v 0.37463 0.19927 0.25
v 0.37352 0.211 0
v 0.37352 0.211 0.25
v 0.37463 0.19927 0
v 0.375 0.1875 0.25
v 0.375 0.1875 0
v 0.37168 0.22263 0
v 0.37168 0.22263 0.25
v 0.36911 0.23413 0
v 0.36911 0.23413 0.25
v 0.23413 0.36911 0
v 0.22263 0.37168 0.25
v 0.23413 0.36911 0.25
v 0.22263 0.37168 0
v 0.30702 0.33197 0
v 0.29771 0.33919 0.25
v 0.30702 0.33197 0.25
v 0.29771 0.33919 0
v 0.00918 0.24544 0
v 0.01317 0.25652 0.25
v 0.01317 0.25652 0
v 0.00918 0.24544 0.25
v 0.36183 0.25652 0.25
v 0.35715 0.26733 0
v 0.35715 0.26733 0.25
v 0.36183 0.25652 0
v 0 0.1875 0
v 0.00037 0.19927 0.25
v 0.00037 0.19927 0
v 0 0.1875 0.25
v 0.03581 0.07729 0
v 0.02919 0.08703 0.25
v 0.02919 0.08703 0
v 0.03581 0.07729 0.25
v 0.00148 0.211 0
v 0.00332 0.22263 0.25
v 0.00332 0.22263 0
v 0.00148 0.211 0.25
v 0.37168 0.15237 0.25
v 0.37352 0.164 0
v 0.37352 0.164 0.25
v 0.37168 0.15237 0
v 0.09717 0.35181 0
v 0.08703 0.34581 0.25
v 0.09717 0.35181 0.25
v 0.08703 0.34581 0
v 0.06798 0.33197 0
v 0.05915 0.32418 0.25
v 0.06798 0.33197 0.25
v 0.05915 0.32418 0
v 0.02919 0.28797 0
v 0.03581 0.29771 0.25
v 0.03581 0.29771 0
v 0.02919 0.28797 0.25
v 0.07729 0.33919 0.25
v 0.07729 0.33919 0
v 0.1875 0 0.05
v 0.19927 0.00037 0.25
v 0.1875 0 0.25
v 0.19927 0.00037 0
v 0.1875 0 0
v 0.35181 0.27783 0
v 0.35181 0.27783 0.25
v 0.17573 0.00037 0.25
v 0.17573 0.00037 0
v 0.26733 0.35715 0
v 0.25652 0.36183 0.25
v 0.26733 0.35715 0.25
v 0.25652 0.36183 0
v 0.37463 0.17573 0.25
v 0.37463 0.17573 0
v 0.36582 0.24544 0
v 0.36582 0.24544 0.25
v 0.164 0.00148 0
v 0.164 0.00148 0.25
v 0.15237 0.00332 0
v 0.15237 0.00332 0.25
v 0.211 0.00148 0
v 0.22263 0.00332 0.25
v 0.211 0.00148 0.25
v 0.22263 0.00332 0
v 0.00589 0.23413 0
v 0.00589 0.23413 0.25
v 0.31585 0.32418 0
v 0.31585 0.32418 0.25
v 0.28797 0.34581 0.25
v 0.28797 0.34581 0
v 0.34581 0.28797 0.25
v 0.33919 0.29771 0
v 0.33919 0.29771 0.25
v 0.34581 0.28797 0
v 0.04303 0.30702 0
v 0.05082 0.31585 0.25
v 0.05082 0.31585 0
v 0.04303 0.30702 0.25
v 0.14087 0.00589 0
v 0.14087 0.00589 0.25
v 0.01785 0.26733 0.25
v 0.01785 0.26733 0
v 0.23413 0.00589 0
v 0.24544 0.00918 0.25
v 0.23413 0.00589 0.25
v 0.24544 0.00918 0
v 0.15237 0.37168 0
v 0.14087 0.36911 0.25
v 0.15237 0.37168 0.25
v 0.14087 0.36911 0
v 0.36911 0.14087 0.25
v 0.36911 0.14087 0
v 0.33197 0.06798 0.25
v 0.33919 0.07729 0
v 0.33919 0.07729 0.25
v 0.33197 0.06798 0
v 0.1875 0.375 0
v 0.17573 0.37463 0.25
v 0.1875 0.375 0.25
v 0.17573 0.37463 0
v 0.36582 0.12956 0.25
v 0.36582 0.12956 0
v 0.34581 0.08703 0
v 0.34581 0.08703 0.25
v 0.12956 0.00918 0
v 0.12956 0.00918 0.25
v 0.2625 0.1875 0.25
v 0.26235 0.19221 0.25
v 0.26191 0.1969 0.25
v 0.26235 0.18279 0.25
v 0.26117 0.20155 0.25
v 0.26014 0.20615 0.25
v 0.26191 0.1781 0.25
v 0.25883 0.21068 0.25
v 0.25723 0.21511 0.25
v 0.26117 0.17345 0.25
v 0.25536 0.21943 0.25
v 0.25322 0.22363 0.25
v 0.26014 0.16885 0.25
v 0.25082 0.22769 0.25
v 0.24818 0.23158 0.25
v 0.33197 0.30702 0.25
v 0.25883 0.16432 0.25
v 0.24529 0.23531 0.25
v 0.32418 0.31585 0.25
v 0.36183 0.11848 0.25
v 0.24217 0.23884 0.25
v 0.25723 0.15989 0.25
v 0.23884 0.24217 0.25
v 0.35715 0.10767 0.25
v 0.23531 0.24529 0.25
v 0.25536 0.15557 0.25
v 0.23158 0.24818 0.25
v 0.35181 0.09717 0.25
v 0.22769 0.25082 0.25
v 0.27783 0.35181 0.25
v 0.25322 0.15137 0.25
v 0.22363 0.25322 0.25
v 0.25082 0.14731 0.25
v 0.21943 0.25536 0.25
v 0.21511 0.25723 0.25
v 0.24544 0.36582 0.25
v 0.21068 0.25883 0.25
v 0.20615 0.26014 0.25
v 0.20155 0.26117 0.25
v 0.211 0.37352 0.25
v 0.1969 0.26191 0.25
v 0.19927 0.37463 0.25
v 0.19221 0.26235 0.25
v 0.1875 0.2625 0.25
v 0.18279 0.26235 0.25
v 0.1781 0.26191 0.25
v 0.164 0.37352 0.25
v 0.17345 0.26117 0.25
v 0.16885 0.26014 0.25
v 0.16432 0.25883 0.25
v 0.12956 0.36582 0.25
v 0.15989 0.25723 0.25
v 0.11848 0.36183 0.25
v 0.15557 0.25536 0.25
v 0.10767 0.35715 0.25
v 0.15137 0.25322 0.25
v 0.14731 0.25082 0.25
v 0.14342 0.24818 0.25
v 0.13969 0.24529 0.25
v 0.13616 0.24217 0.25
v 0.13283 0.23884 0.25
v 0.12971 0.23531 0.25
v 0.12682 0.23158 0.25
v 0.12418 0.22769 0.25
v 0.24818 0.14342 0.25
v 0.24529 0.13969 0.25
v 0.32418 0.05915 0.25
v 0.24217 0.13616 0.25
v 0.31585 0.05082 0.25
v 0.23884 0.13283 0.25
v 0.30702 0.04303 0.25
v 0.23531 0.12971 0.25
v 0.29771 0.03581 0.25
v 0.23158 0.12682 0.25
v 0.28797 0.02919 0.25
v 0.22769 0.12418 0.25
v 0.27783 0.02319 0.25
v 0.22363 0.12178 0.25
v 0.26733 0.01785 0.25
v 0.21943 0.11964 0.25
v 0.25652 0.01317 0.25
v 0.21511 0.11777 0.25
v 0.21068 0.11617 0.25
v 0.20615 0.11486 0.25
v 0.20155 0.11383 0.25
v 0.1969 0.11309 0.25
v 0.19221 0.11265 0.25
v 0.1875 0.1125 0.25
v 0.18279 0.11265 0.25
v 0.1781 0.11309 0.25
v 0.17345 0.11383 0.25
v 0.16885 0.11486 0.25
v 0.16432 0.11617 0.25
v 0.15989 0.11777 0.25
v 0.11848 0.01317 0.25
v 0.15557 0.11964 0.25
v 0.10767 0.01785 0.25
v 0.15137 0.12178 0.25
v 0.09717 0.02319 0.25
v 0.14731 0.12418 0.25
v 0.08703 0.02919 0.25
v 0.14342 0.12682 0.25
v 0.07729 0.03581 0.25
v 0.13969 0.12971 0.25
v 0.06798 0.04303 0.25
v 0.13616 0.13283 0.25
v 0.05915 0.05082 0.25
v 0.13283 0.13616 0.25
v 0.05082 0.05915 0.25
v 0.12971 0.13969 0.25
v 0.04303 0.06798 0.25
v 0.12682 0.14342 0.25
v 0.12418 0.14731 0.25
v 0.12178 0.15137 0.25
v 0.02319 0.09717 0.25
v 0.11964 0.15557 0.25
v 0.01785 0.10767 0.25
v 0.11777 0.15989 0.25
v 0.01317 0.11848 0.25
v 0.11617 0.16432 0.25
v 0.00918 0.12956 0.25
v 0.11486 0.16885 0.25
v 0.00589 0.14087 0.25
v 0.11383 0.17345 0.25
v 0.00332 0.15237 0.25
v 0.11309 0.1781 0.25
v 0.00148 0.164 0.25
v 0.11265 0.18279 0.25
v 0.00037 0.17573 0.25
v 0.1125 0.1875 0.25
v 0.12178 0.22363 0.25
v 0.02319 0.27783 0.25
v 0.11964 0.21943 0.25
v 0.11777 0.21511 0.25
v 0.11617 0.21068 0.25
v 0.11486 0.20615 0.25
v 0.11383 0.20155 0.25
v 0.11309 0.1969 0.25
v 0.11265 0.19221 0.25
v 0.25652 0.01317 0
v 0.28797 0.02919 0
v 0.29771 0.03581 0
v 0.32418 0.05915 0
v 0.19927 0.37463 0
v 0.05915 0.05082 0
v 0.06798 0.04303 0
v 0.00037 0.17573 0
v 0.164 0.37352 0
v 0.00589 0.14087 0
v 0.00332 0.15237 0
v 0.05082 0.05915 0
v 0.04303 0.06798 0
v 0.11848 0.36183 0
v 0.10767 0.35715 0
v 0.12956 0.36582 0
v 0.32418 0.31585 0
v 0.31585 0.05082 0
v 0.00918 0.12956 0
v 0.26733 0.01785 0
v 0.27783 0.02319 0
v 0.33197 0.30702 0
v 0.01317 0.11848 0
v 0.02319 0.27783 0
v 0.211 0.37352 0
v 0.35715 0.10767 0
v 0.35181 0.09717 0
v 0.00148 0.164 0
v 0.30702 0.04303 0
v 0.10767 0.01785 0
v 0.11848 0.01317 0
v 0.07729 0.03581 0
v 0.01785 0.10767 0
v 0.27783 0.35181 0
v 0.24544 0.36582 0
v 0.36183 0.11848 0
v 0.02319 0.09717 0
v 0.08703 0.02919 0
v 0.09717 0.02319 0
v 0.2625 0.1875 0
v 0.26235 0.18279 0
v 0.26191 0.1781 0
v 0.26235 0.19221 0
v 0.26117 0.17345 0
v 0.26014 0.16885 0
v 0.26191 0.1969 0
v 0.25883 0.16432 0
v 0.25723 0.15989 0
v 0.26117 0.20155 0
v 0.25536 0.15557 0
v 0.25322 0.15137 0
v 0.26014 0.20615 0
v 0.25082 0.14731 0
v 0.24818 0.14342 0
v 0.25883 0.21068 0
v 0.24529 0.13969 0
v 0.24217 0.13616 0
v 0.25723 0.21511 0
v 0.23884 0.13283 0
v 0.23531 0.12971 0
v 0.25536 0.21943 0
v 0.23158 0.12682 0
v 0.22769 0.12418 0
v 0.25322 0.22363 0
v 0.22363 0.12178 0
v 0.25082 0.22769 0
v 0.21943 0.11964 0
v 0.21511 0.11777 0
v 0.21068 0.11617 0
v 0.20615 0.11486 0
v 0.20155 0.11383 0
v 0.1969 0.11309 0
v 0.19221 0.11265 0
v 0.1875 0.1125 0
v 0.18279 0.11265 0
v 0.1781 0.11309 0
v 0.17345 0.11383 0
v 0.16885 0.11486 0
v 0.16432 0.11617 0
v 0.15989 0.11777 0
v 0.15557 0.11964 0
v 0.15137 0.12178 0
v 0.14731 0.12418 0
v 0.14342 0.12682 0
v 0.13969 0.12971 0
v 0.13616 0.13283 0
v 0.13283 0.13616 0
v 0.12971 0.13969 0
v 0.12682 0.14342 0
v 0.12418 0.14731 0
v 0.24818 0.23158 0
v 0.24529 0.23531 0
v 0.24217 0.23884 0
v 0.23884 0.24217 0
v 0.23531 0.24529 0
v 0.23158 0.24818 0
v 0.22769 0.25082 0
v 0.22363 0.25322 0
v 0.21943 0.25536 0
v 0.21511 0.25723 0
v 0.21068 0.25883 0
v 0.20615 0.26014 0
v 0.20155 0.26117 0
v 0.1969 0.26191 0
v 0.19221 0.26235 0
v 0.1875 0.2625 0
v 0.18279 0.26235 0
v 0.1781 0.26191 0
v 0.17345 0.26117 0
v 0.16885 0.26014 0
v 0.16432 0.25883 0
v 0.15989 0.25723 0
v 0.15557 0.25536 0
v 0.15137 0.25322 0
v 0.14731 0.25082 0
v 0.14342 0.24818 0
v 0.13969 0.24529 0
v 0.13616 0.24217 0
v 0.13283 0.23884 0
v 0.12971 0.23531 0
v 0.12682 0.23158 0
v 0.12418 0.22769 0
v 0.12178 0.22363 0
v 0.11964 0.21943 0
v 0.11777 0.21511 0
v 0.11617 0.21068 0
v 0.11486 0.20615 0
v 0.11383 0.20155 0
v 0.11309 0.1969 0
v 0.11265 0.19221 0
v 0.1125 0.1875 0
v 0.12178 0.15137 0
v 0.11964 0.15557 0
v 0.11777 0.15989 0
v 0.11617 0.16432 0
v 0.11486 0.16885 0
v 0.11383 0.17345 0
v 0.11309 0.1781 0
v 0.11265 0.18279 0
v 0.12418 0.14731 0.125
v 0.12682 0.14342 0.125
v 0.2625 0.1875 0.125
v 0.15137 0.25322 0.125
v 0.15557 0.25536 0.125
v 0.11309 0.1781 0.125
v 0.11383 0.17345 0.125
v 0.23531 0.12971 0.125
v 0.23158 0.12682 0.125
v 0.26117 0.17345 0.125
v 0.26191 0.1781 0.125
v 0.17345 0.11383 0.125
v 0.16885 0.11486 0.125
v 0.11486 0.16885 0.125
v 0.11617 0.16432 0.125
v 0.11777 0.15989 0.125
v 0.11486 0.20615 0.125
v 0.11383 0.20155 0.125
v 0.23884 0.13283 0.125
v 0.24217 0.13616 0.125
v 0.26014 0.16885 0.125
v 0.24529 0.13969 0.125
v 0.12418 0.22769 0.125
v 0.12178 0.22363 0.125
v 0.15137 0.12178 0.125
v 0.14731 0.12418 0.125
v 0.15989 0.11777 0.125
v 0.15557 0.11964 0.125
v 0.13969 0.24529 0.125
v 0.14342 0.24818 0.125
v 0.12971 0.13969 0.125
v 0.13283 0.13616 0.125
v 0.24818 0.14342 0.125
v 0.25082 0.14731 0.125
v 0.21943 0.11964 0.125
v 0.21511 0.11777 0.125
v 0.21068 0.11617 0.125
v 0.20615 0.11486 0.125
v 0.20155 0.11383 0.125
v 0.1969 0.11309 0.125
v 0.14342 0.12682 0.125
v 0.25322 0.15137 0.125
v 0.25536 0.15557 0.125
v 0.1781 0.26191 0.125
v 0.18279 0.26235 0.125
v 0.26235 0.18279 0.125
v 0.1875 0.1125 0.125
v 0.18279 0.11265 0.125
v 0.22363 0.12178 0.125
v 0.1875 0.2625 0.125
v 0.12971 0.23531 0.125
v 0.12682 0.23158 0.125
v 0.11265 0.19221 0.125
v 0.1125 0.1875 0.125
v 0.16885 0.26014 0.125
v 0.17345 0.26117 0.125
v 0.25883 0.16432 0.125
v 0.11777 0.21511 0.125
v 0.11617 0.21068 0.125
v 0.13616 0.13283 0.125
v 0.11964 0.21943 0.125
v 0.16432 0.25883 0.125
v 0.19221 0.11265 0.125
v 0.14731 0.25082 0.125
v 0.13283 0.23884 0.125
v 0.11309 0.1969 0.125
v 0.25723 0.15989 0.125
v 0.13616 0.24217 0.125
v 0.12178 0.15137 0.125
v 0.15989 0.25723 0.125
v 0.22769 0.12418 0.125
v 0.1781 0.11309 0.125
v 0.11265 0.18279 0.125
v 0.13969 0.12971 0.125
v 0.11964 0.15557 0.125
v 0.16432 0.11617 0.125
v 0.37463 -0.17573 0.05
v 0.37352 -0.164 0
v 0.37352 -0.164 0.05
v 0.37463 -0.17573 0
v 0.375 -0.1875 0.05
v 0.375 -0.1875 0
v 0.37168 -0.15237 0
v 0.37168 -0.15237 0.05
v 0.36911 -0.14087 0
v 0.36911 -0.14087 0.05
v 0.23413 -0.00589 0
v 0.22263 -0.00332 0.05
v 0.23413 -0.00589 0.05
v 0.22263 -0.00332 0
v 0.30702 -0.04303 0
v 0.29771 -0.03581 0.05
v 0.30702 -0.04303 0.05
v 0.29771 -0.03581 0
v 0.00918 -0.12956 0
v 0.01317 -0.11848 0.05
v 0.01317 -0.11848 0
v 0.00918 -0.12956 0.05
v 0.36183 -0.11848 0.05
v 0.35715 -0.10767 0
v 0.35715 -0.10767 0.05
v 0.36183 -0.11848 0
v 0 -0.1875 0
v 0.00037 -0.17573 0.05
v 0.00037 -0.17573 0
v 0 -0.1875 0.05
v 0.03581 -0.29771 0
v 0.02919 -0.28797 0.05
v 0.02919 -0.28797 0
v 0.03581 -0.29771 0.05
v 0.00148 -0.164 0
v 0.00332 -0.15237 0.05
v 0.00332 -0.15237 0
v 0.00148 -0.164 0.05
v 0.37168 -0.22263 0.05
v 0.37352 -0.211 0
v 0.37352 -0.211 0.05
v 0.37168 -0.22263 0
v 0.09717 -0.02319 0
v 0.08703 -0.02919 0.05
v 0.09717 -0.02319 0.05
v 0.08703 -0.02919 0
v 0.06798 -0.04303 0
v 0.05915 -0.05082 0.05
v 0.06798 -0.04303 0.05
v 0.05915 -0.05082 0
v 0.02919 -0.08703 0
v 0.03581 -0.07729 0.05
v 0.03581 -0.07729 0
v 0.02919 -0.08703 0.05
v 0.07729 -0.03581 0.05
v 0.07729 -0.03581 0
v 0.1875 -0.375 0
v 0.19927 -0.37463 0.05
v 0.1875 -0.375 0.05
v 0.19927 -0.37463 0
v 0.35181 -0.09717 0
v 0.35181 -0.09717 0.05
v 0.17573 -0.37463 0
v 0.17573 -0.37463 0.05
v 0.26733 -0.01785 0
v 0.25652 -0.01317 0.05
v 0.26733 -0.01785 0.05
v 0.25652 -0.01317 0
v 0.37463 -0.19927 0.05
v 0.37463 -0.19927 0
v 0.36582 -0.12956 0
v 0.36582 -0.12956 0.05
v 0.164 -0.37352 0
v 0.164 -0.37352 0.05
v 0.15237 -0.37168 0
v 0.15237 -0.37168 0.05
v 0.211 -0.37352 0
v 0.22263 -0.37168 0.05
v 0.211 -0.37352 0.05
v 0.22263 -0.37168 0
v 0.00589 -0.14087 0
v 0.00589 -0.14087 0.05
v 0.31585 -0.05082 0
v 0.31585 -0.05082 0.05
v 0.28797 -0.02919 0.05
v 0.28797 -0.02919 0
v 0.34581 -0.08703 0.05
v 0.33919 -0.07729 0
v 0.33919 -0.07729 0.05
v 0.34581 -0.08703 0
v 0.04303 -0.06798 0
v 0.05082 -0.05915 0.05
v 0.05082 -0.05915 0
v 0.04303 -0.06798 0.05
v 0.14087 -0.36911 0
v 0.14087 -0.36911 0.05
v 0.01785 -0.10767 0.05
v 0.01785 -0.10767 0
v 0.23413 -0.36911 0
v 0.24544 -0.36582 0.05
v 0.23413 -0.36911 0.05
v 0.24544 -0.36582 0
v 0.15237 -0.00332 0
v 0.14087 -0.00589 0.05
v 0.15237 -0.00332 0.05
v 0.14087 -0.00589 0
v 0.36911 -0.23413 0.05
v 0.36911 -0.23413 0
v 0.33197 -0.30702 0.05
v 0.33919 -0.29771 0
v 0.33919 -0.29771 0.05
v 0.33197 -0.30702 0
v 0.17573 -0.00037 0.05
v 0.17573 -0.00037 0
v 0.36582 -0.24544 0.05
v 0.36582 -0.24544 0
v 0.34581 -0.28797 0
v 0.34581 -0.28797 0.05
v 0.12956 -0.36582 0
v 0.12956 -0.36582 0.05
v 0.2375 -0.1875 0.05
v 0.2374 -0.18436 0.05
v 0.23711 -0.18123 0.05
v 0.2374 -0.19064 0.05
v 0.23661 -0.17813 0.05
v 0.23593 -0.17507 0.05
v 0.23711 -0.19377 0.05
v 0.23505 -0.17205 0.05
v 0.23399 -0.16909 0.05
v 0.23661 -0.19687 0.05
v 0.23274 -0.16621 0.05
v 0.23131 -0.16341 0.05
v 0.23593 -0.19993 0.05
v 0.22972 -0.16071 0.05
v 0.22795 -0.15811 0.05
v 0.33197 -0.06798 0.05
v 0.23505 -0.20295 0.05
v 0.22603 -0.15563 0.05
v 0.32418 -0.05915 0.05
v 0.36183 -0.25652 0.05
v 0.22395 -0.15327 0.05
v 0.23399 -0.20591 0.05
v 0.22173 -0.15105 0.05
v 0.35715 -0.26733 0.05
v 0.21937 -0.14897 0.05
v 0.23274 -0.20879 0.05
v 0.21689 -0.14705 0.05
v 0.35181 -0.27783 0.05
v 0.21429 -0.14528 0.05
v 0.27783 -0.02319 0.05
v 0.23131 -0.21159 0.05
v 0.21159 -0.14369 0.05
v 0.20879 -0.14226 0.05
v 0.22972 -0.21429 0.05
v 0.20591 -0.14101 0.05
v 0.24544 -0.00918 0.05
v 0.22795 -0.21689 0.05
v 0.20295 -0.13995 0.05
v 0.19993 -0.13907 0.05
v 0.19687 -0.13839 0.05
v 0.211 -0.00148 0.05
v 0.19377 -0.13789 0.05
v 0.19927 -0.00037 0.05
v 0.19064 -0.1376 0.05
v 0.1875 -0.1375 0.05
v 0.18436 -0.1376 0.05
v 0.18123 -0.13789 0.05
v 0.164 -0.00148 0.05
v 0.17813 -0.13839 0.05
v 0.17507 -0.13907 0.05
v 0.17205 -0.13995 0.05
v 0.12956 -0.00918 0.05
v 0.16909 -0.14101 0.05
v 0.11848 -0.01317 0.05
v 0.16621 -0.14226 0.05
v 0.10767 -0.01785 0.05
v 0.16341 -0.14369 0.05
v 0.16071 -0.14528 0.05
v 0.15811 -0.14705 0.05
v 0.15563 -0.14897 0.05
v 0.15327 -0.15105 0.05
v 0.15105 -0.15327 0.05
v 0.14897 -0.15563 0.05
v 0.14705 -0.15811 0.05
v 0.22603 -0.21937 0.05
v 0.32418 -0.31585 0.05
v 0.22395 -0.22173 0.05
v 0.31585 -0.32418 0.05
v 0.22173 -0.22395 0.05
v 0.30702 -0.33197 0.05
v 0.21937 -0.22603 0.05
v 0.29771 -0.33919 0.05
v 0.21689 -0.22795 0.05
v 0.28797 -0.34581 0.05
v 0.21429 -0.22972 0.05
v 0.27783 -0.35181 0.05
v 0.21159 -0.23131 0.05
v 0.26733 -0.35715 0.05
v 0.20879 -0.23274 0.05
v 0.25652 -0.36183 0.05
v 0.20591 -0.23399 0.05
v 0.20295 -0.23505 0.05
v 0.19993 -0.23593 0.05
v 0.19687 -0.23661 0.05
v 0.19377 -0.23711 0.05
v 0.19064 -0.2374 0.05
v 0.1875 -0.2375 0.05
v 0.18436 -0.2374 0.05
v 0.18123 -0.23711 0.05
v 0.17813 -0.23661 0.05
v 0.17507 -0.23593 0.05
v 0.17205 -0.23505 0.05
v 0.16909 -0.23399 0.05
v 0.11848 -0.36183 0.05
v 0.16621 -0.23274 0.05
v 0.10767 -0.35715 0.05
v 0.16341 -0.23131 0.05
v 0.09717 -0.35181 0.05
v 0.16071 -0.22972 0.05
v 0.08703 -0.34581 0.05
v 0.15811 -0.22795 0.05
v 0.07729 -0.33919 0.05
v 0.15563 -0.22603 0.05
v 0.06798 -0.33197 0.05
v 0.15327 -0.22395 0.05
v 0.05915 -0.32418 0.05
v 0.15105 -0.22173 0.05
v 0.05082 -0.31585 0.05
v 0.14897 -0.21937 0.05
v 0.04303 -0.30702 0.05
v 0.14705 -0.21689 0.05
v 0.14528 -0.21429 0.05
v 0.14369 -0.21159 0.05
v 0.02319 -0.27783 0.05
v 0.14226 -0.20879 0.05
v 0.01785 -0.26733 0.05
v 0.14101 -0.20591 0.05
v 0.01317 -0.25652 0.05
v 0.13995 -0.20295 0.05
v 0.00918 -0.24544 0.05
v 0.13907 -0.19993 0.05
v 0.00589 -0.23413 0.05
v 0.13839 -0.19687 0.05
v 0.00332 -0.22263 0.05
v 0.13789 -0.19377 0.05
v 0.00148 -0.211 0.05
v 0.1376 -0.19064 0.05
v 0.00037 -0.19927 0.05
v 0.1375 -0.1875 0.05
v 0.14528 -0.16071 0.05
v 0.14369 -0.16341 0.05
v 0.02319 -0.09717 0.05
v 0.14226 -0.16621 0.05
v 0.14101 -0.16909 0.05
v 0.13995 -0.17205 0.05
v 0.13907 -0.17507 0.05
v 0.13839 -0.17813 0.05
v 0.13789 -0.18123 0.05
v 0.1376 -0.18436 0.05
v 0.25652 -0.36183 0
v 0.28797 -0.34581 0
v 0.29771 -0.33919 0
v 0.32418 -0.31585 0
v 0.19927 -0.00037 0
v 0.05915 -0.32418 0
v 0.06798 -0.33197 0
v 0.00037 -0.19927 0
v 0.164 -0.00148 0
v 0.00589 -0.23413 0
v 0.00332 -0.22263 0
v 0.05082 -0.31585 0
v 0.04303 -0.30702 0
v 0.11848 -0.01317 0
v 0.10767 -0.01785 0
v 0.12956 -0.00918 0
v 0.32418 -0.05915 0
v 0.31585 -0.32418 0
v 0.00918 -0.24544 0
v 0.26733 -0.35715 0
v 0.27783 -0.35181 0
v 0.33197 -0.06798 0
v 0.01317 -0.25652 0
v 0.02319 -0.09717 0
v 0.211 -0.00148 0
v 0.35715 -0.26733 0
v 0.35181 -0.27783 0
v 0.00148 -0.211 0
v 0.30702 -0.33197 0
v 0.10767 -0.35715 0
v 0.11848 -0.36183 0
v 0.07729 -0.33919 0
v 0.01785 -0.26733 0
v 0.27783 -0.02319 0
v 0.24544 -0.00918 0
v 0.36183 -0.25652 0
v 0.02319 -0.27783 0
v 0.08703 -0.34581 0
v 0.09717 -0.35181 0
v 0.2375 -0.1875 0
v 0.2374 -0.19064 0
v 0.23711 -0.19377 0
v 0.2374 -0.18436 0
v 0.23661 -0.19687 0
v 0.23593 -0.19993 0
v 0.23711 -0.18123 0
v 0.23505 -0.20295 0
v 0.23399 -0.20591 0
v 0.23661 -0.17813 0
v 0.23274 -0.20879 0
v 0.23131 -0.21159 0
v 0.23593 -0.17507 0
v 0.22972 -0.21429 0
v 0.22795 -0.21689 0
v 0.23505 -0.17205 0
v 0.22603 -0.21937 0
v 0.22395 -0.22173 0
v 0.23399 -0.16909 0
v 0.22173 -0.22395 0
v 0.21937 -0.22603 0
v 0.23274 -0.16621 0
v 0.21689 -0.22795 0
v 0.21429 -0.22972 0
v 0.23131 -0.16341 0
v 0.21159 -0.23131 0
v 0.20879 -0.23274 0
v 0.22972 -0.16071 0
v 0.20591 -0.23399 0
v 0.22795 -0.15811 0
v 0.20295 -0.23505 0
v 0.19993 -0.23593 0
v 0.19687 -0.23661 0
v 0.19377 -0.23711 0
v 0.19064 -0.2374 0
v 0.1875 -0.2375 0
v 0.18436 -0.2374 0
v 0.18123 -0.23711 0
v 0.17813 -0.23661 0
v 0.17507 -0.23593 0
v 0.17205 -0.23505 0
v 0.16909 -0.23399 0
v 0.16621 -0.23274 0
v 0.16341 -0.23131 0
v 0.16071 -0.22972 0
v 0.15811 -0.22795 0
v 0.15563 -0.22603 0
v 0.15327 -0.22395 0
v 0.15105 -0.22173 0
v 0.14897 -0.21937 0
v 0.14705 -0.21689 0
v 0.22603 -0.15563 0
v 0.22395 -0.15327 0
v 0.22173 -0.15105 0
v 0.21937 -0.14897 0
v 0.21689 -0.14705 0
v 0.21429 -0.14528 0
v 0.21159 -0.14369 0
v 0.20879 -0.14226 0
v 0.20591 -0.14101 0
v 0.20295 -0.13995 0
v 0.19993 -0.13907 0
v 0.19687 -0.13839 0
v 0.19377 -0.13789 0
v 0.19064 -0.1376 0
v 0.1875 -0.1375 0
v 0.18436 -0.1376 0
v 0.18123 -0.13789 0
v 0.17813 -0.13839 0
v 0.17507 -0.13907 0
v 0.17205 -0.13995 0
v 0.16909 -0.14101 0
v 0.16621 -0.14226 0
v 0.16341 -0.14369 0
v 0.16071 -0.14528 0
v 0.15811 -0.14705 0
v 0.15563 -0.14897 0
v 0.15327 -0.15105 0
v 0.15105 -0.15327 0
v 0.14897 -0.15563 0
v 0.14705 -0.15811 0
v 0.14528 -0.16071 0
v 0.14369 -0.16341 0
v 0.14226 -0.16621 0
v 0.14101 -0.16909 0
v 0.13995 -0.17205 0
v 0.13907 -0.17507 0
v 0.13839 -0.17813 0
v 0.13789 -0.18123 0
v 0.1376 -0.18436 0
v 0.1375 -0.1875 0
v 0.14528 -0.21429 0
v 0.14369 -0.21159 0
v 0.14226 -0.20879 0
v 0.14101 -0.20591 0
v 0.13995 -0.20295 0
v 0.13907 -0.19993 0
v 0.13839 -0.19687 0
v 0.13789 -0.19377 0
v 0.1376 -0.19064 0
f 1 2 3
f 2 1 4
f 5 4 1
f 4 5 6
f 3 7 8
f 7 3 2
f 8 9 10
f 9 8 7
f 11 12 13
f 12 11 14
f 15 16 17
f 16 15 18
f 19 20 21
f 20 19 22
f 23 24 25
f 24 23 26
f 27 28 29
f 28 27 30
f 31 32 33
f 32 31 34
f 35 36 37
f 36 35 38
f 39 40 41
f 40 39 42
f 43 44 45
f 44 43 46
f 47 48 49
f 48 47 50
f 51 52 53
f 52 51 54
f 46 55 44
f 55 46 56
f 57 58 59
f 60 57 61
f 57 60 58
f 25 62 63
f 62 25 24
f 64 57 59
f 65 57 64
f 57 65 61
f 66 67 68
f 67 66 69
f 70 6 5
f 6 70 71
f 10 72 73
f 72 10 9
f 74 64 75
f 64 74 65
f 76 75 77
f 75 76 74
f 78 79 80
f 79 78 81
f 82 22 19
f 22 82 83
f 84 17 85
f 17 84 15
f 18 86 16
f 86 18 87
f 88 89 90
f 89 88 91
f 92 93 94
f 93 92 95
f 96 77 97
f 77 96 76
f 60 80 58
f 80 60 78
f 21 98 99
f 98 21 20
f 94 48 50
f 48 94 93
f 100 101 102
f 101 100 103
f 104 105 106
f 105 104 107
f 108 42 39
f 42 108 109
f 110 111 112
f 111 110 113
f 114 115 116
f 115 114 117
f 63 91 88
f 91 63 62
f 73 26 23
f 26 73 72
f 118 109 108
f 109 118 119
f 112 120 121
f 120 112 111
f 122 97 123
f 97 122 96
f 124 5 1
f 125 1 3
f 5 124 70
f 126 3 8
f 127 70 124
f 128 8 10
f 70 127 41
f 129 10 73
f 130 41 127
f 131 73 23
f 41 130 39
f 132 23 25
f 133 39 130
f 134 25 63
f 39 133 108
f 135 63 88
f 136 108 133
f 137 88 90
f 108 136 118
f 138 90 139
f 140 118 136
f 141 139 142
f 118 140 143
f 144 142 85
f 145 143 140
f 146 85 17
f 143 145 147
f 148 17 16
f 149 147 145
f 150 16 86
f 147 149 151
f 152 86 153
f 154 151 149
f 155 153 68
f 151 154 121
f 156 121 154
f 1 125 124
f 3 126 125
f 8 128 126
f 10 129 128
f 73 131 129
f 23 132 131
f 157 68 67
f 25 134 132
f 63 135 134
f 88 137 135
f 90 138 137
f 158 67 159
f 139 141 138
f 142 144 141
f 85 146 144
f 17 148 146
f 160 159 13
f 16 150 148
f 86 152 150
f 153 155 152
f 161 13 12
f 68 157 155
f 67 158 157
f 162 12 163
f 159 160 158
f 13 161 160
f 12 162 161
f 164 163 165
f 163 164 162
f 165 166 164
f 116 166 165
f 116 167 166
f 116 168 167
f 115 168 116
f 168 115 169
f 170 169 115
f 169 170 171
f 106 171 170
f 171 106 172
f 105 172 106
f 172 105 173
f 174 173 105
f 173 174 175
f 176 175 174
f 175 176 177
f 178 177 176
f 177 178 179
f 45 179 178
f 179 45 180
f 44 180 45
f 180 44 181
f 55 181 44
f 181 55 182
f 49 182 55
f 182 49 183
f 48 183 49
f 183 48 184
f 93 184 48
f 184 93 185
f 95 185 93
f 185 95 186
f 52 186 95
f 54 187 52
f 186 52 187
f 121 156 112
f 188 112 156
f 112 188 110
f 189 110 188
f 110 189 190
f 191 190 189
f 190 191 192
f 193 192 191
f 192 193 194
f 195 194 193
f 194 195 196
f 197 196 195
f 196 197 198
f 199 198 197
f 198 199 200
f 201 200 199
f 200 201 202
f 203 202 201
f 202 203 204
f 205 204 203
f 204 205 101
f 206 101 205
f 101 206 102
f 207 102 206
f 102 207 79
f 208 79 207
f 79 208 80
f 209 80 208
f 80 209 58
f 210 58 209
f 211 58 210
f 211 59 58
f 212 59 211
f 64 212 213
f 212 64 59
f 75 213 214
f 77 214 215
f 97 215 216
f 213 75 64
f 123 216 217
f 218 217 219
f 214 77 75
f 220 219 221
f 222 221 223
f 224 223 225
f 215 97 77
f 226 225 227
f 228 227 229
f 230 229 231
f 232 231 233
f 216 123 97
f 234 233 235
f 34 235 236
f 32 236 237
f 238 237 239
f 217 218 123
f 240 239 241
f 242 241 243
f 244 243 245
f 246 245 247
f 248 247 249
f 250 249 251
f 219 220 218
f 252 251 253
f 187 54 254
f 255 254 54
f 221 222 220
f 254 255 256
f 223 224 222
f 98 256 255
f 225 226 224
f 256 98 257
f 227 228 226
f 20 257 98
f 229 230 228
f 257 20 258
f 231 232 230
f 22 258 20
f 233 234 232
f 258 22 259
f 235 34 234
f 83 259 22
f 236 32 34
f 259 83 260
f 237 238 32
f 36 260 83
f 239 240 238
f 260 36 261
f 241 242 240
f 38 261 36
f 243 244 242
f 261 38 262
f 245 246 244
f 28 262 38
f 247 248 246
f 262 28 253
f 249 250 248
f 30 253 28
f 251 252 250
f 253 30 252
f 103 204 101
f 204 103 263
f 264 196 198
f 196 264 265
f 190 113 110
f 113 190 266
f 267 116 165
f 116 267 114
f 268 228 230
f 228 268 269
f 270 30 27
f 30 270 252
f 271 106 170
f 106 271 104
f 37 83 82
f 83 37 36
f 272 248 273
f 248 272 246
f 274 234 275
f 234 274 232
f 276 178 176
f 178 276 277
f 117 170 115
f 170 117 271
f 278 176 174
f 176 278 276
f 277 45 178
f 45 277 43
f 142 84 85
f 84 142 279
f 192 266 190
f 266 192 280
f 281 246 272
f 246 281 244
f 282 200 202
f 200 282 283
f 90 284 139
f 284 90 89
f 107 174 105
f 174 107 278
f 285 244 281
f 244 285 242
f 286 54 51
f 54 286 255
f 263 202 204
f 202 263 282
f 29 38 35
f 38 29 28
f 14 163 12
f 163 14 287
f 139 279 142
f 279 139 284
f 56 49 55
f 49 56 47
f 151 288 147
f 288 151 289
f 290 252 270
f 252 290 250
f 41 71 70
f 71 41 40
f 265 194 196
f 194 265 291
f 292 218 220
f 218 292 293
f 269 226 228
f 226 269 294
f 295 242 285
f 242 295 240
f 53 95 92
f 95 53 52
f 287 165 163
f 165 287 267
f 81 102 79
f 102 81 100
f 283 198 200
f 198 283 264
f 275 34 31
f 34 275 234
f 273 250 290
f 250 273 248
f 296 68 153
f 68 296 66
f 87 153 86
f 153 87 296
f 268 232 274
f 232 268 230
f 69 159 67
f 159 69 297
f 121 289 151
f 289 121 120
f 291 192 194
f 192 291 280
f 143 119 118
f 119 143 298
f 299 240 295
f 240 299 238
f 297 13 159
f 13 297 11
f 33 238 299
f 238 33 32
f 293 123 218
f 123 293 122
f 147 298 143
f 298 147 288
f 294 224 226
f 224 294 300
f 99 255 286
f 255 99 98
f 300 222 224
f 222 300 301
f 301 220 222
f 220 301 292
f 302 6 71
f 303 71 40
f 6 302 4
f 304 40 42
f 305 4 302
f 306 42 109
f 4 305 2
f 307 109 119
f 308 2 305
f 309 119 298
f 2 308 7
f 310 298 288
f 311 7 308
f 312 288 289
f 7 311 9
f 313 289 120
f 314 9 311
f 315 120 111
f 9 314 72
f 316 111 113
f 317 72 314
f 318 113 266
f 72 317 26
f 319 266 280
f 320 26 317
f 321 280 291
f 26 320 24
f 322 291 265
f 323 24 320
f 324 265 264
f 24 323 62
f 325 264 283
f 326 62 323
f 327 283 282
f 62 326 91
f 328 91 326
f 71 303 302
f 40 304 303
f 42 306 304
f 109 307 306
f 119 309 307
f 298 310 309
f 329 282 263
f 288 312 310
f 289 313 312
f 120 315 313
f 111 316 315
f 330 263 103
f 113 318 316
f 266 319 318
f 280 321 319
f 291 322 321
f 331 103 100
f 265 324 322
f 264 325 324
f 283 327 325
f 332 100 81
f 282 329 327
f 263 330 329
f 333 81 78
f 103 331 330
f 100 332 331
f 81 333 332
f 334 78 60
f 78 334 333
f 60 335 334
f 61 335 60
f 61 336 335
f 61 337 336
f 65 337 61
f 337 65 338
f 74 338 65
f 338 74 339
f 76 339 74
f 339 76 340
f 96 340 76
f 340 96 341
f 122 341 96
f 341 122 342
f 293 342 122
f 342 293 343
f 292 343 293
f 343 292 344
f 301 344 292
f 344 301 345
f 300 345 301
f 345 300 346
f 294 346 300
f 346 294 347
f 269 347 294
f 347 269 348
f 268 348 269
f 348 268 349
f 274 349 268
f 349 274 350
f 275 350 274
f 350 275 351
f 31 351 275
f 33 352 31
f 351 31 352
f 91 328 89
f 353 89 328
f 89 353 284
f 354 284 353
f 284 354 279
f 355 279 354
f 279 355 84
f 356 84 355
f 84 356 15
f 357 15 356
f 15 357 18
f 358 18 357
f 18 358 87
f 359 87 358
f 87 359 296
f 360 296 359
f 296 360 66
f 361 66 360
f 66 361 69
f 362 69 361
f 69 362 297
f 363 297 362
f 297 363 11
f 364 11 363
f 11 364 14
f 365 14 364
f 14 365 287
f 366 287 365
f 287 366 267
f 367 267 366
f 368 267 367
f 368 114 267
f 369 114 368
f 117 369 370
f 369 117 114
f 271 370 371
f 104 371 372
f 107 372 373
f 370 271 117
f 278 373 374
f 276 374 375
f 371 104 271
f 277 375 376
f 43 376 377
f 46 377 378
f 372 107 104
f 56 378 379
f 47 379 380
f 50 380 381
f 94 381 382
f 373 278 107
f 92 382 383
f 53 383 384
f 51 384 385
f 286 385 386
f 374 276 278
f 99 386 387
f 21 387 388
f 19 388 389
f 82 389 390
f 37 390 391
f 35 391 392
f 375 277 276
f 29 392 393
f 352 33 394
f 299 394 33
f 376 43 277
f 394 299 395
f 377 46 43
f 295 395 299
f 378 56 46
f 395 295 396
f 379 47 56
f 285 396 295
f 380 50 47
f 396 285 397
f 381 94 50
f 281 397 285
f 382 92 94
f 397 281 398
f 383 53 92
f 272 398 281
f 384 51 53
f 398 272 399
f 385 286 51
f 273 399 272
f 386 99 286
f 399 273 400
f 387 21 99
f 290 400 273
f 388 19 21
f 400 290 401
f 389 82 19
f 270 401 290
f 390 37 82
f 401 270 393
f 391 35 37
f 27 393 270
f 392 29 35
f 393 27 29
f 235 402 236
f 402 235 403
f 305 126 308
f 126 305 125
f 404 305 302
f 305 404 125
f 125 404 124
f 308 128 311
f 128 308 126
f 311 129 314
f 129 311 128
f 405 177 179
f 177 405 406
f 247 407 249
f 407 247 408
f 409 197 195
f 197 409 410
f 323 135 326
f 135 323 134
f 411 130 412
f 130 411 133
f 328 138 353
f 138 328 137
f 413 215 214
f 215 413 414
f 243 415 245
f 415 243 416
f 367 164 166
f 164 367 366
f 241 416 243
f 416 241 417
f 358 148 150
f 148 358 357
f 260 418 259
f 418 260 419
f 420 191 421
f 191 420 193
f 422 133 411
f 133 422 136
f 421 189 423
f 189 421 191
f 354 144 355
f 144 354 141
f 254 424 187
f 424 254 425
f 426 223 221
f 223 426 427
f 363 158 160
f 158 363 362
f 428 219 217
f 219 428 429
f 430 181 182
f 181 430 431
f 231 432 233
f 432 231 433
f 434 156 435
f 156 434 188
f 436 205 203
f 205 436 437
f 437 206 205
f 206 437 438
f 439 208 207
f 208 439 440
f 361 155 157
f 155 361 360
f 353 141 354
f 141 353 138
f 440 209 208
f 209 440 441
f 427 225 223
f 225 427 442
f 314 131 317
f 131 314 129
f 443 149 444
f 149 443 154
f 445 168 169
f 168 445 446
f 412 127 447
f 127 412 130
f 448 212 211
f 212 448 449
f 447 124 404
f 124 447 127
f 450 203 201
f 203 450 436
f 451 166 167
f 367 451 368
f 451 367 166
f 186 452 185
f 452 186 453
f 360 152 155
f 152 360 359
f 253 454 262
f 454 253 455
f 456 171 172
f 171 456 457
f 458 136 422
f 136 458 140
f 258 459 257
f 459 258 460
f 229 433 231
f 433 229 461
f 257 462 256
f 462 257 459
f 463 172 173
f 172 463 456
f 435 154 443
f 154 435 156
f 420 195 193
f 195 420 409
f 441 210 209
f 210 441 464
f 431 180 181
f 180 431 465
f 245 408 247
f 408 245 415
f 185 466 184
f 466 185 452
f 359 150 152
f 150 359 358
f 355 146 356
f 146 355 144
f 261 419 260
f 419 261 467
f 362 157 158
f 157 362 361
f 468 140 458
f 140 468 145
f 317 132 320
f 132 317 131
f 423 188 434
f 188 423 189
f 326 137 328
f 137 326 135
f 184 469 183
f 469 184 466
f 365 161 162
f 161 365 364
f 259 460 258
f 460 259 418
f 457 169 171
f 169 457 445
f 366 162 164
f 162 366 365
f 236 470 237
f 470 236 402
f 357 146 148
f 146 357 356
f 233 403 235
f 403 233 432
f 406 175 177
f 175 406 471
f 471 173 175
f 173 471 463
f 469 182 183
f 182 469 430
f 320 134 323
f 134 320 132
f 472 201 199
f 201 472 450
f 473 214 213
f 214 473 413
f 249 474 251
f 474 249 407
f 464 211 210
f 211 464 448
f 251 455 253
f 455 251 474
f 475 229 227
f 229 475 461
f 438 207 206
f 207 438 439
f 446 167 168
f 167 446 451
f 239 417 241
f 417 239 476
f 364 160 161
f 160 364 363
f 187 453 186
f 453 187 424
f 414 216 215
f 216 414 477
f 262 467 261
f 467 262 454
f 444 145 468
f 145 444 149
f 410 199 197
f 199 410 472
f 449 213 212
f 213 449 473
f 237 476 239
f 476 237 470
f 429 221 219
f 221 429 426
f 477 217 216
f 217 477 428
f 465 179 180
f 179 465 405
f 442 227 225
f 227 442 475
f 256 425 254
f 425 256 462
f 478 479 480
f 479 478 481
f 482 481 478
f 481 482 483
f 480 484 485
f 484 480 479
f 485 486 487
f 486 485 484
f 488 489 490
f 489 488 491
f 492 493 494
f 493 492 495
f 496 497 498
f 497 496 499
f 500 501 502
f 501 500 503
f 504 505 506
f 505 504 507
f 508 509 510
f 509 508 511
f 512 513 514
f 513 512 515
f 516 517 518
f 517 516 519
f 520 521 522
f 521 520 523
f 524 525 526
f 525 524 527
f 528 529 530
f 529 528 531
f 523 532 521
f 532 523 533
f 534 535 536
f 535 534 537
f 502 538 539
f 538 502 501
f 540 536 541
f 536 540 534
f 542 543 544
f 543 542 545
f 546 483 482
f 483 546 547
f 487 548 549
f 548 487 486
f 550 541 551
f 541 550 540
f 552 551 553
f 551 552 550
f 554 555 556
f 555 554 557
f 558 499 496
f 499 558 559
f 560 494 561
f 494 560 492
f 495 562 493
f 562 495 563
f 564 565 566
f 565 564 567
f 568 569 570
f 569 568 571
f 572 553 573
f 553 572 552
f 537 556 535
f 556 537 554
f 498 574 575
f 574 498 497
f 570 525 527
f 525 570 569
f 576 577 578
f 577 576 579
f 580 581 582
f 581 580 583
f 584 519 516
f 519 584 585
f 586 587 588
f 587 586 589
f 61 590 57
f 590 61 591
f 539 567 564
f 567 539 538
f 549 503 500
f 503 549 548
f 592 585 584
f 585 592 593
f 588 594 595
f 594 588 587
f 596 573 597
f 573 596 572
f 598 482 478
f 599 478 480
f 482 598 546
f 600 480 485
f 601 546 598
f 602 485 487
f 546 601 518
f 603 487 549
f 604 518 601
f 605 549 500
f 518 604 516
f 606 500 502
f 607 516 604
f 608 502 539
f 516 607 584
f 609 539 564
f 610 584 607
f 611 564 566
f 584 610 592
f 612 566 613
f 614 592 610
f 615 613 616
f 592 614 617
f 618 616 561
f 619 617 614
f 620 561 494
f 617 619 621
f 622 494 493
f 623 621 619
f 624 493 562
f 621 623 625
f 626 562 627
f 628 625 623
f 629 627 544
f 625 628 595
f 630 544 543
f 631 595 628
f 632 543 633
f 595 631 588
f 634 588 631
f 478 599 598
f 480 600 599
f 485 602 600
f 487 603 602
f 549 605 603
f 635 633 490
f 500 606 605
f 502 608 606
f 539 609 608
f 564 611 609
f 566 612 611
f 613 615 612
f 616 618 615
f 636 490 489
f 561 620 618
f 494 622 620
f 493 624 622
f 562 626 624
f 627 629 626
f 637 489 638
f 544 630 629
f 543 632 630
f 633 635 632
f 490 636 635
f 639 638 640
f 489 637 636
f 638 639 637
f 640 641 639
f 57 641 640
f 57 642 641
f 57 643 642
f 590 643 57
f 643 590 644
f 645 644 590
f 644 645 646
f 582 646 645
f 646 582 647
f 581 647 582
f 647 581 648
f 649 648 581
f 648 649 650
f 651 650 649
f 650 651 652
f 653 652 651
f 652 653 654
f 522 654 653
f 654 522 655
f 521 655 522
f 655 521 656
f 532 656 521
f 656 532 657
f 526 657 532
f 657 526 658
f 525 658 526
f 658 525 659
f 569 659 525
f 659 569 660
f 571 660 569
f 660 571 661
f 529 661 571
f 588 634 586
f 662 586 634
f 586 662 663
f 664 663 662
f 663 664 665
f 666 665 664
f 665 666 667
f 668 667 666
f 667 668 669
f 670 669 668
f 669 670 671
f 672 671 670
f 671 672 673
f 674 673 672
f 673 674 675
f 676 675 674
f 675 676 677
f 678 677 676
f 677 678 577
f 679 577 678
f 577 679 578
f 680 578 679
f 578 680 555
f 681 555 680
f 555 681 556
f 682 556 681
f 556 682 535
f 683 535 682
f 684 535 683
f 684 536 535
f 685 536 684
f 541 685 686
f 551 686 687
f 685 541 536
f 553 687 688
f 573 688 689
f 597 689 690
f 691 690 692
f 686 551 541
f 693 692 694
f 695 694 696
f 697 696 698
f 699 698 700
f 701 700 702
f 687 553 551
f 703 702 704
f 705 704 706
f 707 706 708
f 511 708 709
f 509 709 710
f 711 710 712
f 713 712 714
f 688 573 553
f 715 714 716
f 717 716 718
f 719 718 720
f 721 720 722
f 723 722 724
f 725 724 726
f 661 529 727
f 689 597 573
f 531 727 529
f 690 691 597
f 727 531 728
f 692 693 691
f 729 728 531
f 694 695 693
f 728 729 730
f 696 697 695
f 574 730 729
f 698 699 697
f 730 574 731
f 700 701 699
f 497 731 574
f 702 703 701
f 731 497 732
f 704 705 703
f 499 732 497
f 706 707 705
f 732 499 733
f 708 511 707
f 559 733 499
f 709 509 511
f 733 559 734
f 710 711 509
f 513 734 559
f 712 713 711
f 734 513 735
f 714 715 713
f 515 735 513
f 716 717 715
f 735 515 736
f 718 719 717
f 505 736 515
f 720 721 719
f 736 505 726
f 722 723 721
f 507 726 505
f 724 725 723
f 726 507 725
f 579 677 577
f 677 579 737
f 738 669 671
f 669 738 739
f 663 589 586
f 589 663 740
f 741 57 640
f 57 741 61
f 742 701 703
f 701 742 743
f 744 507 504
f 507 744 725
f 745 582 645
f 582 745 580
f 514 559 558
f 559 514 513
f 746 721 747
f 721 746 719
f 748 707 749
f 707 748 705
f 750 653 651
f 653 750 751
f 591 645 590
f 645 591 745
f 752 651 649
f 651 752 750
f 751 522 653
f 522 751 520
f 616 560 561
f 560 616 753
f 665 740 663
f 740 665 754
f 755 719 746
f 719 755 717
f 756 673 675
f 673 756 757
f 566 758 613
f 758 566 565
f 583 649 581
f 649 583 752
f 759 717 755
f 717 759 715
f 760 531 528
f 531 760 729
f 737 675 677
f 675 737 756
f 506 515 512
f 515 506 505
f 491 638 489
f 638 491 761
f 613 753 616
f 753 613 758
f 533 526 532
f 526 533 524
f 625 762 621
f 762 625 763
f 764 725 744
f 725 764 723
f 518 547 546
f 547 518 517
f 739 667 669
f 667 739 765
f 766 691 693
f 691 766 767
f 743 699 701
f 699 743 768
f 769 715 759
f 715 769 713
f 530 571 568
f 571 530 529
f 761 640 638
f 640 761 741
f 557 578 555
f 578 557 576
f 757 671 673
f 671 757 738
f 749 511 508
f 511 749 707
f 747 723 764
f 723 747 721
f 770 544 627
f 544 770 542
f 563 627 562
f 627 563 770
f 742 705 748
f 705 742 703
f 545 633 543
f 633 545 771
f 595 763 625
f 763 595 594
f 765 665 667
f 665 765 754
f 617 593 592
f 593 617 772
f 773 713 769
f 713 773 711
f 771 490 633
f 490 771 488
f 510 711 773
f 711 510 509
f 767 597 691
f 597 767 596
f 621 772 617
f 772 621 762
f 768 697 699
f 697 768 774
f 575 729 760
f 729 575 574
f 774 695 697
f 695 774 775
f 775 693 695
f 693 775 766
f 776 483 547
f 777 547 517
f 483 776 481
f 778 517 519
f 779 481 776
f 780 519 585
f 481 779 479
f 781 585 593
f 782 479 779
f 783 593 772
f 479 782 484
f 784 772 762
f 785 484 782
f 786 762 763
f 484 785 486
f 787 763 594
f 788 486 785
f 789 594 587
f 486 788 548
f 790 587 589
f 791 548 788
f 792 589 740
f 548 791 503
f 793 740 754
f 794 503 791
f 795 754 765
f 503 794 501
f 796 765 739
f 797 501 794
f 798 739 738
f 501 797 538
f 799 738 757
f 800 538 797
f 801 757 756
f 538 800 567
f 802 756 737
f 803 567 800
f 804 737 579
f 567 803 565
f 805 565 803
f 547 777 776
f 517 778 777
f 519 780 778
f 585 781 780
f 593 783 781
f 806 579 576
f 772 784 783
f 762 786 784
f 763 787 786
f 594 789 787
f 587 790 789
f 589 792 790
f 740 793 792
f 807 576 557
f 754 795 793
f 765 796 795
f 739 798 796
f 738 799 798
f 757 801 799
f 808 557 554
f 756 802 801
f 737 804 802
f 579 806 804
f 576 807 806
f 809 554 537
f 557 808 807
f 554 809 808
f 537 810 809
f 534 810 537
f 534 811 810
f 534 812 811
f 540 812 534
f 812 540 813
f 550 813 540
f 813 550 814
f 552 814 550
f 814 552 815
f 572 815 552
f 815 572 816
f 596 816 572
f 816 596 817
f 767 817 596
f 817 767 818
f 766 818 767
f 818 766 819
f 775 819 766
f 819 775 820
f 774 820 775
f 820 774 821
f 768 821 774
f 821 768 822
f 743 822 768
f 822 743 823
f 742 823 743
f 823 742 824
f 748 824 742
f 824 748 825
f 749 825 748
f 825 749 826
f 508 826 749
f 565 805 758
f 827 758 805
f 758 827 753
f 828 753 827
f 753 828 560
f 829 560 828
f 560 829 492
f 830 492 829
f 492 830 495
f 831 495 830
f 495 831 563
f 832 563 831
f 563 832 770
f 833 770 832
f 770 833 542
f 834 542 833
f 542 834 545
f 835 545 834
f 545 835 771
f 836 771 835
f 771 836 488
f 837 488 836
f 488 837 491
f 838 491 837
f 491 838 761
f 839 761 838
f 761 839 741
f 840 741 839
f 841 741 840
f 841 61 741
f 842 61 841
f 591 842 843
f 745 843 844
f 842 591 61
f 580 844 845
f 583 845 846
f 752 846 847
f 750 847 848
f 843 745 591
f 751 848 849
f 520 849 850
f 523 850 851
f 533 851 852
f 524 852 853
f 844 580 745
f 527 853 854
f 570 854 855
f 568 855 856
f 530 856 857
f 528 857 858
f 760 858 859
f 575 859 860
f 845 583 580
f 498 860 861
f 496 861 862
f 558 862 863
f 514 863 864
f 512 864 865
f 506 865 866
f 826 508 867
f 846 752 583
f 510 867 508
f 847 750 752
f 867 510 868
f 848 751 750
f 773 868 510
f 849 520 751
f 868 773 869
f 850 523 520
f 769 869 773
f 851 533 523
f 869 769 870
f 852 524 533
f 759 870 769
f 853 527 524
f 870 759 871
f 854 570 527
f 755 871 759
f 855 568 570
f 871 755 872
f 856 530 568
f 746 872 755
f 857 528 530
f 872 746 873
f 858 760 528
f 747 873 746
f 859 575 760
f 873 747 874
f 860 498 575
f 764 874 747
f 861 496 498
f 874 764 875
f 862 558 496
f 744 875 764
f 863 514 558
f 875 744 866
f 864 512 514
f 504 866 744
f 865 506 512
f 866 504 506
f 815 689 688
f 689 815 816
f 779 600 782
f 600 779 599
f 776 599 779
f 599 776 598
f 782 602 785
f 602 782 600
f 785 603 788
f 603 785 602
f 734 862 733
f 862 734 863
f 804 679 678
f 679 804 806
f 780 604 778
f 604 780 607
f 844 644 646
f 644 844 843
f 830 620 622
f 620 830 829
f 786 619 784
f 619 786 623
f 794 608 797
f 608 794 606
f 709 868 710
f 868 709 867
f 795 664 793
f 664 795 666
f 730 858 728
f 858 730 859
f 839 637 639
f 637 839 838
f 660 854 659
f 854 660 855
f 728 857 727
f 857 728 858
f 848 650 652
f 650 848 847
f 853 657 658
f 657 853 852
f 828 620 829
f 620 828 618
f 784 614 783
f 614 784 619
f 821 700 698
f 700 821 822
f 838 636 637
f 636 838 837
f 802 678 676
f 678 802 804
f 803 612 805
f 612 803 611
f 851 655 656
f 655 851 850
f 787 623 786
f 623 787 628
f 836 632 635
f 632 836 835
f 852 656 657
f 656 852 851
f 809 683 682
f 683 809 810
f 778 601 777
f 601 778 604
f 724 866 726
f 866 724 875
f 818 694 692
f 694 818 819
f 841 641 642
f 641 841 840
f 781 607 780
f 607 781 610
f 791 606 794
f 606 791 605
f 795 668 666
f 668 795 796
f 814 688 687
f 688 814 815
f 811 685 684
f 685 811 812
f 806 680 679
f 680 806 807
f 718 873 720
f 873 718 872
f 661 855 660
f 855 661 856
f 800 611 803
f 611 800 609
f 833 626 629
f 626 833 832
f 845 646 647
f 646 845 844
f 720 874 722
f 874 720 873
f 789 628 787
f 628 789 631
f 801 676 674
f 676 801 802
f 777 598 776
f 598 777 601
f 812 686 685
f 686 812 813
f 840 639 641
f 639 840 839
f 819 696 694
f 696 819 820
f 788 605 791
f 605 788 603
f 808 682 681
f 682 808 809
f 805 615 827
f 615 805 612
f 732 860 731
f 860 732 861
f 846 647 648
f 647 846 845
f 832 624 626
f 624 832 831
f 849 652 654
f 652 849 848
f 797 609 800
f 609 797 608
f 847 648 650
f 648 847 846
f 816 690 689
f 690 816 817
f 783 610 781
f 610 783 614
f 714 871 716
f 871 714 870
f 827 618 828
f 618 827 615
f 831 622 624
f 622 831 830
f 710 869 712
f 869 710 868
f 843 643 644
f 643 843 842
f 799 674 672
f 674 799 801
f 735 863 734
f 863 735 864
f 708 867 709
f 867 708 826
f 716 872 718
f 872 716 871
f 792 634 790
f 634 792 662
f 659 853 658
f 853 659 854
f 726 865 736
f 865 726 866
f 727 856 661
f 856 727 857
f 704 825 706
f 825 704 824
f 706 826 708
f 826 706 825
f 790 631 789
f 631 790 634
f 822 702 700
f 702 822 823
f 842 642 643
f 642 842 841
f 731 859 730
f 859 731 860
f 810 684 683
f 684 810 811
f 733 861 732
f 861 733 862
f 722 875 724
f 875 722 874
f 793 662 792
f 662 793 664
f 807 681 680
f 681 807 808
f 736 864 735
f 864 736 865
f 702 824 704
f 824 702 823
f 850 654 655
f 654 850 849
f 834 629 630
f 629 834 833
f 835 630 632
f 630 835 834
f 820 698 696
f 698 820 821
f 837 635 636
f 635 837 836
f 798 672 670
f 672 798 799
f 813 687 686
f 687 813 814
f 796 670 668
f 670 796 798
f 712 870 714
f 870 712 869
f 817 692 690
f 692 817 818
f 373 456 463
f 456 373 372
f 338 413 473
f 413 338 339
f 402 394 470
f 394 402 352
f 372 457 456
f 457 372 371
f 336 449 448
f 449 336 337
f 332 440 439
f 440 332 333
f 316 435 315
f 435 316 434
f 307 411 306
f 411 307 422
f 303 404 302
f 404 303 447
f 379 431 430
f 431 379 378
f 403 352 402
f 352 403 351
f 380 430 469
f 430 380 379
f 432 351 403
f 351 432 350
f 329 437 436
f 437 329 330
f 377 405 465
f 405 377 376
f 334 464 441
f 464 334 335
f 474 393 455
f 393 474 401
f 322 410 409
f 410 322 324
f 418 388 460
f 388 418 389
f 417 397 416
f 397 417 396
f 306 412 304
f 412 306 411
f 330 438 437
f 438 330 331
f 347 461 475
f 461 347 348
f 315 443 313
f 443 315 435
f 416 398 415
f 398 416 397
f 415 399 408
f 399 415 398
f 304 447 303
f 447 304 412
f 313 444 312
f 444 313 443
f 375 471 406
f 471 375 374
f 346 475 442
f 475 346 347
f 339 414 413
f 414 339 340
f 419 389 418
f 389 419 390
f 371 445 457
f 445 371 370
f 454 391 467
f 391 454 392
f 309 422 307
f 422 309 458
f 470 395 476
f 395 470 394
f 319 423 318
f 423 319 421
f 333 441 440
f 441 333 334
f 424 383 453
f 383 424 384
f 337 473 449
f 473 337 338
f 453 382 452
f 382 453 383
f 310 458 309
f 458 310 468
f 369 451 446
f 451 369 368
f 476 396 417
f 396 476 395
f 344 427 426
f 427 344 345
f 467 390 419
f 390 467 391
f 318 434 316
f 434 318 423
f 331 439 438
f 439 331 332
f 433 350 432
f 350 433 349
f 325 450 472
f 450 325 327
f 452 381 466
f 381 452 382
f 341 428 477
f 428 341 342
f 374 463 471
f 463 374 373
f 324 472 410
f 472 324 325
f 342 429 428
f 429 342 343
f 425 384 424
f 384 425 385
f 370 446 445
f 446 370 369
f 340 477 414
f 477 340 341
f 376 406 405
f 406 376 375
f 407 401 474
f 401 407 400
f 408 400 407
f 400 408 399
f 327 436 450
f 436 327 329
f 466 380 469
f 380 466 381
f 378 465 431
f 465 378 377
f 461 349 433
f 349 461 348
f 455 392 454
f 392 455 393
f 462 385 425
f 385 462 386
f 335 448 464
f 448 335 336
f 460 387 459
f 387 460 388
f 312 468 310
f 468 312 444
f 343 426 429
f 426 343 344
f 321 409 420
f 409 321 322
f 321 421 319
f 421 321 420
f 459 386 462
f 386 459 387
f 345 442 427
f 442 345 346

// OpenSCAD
// Global resolution for smooth curved surfaces
$fn = 100;

// ==============================
// PARAMETRIC DIMENSION DEFINITIONS
// ==============================
// Base reference dimensions
ref_length = 0.375;   // X-axis reference span
ref_width = 0.375;    // Y-axis reference span
ref_height = 0.25;    // Z-axis max height of main sleeve

// Main annular sleeve parameters
main_center_x = 0.1875;   // X position of main cylinder center
main_center_y = 0.1875;   // Y position of main cylinder center
main_outer_r = 0.1875;    // Outer radius of main sleeve
main_bore_r = 0.075;      // Inner through bore radius of main sleeve
main_height = ref_height; // Total height of main sleeve

// Shallow annular tab parameters
tab_center_x = 0.1875;    // X position of tab center
tab_center_y = -0.1875;   // Y position of tab center
tab_outer_r = 0.1875;     // Outer radius of tab
tab_bore_r = 0.05;        // Inner through bore radius of tab
tab_height = 0.05;        // Height of shallow tab (lower than main sleeve)

// Underside recess cut parameters
recess_center_x = main_center_x;
recess_center_y = main_center_y;
recess_r = 0.075;         // Radius of underside recess
recess_depth = 0.125;     // Depth of recess measured up from base (Z=0)

// ==============================
// REUSABLE MODULE DEFINITIONS
// ==============================
// Annular (hollow) cylinder module
module annular_cylinder(height, outer_r, inner_r, center = false) {
    difference() {
        // Outer solid cylinder
        cylinder(h = height, r = outer_r, center = center);
        // Inner through bore (extra height to ensure complete cut)
        cylinder(h = height + 0.1, r = inner_r, center = center);
    }
}

// ==============================
// MAIN MODEL ASSEMBLY
// ==============================
difference() {
    // Union of all positive solid features
    union() {
        // Main annular sleeve
        translate([main_center_x, main_center_y, 0])
            annular_cylinder(main_height, main_outer_r, main_bore_r);
        
        // Shallow attached annular tab
        translate([tab_center_x, tab_center_y, 0])
            annular_cylinder(tab_height, tab_outer_r, tab_bore_r);
    }
    
    // Underside recess cut associated with main bore
    translate([recess_center_x, recess_center_y, 0])
        cylinder(h = recess_depth, r = recess_r);
}
